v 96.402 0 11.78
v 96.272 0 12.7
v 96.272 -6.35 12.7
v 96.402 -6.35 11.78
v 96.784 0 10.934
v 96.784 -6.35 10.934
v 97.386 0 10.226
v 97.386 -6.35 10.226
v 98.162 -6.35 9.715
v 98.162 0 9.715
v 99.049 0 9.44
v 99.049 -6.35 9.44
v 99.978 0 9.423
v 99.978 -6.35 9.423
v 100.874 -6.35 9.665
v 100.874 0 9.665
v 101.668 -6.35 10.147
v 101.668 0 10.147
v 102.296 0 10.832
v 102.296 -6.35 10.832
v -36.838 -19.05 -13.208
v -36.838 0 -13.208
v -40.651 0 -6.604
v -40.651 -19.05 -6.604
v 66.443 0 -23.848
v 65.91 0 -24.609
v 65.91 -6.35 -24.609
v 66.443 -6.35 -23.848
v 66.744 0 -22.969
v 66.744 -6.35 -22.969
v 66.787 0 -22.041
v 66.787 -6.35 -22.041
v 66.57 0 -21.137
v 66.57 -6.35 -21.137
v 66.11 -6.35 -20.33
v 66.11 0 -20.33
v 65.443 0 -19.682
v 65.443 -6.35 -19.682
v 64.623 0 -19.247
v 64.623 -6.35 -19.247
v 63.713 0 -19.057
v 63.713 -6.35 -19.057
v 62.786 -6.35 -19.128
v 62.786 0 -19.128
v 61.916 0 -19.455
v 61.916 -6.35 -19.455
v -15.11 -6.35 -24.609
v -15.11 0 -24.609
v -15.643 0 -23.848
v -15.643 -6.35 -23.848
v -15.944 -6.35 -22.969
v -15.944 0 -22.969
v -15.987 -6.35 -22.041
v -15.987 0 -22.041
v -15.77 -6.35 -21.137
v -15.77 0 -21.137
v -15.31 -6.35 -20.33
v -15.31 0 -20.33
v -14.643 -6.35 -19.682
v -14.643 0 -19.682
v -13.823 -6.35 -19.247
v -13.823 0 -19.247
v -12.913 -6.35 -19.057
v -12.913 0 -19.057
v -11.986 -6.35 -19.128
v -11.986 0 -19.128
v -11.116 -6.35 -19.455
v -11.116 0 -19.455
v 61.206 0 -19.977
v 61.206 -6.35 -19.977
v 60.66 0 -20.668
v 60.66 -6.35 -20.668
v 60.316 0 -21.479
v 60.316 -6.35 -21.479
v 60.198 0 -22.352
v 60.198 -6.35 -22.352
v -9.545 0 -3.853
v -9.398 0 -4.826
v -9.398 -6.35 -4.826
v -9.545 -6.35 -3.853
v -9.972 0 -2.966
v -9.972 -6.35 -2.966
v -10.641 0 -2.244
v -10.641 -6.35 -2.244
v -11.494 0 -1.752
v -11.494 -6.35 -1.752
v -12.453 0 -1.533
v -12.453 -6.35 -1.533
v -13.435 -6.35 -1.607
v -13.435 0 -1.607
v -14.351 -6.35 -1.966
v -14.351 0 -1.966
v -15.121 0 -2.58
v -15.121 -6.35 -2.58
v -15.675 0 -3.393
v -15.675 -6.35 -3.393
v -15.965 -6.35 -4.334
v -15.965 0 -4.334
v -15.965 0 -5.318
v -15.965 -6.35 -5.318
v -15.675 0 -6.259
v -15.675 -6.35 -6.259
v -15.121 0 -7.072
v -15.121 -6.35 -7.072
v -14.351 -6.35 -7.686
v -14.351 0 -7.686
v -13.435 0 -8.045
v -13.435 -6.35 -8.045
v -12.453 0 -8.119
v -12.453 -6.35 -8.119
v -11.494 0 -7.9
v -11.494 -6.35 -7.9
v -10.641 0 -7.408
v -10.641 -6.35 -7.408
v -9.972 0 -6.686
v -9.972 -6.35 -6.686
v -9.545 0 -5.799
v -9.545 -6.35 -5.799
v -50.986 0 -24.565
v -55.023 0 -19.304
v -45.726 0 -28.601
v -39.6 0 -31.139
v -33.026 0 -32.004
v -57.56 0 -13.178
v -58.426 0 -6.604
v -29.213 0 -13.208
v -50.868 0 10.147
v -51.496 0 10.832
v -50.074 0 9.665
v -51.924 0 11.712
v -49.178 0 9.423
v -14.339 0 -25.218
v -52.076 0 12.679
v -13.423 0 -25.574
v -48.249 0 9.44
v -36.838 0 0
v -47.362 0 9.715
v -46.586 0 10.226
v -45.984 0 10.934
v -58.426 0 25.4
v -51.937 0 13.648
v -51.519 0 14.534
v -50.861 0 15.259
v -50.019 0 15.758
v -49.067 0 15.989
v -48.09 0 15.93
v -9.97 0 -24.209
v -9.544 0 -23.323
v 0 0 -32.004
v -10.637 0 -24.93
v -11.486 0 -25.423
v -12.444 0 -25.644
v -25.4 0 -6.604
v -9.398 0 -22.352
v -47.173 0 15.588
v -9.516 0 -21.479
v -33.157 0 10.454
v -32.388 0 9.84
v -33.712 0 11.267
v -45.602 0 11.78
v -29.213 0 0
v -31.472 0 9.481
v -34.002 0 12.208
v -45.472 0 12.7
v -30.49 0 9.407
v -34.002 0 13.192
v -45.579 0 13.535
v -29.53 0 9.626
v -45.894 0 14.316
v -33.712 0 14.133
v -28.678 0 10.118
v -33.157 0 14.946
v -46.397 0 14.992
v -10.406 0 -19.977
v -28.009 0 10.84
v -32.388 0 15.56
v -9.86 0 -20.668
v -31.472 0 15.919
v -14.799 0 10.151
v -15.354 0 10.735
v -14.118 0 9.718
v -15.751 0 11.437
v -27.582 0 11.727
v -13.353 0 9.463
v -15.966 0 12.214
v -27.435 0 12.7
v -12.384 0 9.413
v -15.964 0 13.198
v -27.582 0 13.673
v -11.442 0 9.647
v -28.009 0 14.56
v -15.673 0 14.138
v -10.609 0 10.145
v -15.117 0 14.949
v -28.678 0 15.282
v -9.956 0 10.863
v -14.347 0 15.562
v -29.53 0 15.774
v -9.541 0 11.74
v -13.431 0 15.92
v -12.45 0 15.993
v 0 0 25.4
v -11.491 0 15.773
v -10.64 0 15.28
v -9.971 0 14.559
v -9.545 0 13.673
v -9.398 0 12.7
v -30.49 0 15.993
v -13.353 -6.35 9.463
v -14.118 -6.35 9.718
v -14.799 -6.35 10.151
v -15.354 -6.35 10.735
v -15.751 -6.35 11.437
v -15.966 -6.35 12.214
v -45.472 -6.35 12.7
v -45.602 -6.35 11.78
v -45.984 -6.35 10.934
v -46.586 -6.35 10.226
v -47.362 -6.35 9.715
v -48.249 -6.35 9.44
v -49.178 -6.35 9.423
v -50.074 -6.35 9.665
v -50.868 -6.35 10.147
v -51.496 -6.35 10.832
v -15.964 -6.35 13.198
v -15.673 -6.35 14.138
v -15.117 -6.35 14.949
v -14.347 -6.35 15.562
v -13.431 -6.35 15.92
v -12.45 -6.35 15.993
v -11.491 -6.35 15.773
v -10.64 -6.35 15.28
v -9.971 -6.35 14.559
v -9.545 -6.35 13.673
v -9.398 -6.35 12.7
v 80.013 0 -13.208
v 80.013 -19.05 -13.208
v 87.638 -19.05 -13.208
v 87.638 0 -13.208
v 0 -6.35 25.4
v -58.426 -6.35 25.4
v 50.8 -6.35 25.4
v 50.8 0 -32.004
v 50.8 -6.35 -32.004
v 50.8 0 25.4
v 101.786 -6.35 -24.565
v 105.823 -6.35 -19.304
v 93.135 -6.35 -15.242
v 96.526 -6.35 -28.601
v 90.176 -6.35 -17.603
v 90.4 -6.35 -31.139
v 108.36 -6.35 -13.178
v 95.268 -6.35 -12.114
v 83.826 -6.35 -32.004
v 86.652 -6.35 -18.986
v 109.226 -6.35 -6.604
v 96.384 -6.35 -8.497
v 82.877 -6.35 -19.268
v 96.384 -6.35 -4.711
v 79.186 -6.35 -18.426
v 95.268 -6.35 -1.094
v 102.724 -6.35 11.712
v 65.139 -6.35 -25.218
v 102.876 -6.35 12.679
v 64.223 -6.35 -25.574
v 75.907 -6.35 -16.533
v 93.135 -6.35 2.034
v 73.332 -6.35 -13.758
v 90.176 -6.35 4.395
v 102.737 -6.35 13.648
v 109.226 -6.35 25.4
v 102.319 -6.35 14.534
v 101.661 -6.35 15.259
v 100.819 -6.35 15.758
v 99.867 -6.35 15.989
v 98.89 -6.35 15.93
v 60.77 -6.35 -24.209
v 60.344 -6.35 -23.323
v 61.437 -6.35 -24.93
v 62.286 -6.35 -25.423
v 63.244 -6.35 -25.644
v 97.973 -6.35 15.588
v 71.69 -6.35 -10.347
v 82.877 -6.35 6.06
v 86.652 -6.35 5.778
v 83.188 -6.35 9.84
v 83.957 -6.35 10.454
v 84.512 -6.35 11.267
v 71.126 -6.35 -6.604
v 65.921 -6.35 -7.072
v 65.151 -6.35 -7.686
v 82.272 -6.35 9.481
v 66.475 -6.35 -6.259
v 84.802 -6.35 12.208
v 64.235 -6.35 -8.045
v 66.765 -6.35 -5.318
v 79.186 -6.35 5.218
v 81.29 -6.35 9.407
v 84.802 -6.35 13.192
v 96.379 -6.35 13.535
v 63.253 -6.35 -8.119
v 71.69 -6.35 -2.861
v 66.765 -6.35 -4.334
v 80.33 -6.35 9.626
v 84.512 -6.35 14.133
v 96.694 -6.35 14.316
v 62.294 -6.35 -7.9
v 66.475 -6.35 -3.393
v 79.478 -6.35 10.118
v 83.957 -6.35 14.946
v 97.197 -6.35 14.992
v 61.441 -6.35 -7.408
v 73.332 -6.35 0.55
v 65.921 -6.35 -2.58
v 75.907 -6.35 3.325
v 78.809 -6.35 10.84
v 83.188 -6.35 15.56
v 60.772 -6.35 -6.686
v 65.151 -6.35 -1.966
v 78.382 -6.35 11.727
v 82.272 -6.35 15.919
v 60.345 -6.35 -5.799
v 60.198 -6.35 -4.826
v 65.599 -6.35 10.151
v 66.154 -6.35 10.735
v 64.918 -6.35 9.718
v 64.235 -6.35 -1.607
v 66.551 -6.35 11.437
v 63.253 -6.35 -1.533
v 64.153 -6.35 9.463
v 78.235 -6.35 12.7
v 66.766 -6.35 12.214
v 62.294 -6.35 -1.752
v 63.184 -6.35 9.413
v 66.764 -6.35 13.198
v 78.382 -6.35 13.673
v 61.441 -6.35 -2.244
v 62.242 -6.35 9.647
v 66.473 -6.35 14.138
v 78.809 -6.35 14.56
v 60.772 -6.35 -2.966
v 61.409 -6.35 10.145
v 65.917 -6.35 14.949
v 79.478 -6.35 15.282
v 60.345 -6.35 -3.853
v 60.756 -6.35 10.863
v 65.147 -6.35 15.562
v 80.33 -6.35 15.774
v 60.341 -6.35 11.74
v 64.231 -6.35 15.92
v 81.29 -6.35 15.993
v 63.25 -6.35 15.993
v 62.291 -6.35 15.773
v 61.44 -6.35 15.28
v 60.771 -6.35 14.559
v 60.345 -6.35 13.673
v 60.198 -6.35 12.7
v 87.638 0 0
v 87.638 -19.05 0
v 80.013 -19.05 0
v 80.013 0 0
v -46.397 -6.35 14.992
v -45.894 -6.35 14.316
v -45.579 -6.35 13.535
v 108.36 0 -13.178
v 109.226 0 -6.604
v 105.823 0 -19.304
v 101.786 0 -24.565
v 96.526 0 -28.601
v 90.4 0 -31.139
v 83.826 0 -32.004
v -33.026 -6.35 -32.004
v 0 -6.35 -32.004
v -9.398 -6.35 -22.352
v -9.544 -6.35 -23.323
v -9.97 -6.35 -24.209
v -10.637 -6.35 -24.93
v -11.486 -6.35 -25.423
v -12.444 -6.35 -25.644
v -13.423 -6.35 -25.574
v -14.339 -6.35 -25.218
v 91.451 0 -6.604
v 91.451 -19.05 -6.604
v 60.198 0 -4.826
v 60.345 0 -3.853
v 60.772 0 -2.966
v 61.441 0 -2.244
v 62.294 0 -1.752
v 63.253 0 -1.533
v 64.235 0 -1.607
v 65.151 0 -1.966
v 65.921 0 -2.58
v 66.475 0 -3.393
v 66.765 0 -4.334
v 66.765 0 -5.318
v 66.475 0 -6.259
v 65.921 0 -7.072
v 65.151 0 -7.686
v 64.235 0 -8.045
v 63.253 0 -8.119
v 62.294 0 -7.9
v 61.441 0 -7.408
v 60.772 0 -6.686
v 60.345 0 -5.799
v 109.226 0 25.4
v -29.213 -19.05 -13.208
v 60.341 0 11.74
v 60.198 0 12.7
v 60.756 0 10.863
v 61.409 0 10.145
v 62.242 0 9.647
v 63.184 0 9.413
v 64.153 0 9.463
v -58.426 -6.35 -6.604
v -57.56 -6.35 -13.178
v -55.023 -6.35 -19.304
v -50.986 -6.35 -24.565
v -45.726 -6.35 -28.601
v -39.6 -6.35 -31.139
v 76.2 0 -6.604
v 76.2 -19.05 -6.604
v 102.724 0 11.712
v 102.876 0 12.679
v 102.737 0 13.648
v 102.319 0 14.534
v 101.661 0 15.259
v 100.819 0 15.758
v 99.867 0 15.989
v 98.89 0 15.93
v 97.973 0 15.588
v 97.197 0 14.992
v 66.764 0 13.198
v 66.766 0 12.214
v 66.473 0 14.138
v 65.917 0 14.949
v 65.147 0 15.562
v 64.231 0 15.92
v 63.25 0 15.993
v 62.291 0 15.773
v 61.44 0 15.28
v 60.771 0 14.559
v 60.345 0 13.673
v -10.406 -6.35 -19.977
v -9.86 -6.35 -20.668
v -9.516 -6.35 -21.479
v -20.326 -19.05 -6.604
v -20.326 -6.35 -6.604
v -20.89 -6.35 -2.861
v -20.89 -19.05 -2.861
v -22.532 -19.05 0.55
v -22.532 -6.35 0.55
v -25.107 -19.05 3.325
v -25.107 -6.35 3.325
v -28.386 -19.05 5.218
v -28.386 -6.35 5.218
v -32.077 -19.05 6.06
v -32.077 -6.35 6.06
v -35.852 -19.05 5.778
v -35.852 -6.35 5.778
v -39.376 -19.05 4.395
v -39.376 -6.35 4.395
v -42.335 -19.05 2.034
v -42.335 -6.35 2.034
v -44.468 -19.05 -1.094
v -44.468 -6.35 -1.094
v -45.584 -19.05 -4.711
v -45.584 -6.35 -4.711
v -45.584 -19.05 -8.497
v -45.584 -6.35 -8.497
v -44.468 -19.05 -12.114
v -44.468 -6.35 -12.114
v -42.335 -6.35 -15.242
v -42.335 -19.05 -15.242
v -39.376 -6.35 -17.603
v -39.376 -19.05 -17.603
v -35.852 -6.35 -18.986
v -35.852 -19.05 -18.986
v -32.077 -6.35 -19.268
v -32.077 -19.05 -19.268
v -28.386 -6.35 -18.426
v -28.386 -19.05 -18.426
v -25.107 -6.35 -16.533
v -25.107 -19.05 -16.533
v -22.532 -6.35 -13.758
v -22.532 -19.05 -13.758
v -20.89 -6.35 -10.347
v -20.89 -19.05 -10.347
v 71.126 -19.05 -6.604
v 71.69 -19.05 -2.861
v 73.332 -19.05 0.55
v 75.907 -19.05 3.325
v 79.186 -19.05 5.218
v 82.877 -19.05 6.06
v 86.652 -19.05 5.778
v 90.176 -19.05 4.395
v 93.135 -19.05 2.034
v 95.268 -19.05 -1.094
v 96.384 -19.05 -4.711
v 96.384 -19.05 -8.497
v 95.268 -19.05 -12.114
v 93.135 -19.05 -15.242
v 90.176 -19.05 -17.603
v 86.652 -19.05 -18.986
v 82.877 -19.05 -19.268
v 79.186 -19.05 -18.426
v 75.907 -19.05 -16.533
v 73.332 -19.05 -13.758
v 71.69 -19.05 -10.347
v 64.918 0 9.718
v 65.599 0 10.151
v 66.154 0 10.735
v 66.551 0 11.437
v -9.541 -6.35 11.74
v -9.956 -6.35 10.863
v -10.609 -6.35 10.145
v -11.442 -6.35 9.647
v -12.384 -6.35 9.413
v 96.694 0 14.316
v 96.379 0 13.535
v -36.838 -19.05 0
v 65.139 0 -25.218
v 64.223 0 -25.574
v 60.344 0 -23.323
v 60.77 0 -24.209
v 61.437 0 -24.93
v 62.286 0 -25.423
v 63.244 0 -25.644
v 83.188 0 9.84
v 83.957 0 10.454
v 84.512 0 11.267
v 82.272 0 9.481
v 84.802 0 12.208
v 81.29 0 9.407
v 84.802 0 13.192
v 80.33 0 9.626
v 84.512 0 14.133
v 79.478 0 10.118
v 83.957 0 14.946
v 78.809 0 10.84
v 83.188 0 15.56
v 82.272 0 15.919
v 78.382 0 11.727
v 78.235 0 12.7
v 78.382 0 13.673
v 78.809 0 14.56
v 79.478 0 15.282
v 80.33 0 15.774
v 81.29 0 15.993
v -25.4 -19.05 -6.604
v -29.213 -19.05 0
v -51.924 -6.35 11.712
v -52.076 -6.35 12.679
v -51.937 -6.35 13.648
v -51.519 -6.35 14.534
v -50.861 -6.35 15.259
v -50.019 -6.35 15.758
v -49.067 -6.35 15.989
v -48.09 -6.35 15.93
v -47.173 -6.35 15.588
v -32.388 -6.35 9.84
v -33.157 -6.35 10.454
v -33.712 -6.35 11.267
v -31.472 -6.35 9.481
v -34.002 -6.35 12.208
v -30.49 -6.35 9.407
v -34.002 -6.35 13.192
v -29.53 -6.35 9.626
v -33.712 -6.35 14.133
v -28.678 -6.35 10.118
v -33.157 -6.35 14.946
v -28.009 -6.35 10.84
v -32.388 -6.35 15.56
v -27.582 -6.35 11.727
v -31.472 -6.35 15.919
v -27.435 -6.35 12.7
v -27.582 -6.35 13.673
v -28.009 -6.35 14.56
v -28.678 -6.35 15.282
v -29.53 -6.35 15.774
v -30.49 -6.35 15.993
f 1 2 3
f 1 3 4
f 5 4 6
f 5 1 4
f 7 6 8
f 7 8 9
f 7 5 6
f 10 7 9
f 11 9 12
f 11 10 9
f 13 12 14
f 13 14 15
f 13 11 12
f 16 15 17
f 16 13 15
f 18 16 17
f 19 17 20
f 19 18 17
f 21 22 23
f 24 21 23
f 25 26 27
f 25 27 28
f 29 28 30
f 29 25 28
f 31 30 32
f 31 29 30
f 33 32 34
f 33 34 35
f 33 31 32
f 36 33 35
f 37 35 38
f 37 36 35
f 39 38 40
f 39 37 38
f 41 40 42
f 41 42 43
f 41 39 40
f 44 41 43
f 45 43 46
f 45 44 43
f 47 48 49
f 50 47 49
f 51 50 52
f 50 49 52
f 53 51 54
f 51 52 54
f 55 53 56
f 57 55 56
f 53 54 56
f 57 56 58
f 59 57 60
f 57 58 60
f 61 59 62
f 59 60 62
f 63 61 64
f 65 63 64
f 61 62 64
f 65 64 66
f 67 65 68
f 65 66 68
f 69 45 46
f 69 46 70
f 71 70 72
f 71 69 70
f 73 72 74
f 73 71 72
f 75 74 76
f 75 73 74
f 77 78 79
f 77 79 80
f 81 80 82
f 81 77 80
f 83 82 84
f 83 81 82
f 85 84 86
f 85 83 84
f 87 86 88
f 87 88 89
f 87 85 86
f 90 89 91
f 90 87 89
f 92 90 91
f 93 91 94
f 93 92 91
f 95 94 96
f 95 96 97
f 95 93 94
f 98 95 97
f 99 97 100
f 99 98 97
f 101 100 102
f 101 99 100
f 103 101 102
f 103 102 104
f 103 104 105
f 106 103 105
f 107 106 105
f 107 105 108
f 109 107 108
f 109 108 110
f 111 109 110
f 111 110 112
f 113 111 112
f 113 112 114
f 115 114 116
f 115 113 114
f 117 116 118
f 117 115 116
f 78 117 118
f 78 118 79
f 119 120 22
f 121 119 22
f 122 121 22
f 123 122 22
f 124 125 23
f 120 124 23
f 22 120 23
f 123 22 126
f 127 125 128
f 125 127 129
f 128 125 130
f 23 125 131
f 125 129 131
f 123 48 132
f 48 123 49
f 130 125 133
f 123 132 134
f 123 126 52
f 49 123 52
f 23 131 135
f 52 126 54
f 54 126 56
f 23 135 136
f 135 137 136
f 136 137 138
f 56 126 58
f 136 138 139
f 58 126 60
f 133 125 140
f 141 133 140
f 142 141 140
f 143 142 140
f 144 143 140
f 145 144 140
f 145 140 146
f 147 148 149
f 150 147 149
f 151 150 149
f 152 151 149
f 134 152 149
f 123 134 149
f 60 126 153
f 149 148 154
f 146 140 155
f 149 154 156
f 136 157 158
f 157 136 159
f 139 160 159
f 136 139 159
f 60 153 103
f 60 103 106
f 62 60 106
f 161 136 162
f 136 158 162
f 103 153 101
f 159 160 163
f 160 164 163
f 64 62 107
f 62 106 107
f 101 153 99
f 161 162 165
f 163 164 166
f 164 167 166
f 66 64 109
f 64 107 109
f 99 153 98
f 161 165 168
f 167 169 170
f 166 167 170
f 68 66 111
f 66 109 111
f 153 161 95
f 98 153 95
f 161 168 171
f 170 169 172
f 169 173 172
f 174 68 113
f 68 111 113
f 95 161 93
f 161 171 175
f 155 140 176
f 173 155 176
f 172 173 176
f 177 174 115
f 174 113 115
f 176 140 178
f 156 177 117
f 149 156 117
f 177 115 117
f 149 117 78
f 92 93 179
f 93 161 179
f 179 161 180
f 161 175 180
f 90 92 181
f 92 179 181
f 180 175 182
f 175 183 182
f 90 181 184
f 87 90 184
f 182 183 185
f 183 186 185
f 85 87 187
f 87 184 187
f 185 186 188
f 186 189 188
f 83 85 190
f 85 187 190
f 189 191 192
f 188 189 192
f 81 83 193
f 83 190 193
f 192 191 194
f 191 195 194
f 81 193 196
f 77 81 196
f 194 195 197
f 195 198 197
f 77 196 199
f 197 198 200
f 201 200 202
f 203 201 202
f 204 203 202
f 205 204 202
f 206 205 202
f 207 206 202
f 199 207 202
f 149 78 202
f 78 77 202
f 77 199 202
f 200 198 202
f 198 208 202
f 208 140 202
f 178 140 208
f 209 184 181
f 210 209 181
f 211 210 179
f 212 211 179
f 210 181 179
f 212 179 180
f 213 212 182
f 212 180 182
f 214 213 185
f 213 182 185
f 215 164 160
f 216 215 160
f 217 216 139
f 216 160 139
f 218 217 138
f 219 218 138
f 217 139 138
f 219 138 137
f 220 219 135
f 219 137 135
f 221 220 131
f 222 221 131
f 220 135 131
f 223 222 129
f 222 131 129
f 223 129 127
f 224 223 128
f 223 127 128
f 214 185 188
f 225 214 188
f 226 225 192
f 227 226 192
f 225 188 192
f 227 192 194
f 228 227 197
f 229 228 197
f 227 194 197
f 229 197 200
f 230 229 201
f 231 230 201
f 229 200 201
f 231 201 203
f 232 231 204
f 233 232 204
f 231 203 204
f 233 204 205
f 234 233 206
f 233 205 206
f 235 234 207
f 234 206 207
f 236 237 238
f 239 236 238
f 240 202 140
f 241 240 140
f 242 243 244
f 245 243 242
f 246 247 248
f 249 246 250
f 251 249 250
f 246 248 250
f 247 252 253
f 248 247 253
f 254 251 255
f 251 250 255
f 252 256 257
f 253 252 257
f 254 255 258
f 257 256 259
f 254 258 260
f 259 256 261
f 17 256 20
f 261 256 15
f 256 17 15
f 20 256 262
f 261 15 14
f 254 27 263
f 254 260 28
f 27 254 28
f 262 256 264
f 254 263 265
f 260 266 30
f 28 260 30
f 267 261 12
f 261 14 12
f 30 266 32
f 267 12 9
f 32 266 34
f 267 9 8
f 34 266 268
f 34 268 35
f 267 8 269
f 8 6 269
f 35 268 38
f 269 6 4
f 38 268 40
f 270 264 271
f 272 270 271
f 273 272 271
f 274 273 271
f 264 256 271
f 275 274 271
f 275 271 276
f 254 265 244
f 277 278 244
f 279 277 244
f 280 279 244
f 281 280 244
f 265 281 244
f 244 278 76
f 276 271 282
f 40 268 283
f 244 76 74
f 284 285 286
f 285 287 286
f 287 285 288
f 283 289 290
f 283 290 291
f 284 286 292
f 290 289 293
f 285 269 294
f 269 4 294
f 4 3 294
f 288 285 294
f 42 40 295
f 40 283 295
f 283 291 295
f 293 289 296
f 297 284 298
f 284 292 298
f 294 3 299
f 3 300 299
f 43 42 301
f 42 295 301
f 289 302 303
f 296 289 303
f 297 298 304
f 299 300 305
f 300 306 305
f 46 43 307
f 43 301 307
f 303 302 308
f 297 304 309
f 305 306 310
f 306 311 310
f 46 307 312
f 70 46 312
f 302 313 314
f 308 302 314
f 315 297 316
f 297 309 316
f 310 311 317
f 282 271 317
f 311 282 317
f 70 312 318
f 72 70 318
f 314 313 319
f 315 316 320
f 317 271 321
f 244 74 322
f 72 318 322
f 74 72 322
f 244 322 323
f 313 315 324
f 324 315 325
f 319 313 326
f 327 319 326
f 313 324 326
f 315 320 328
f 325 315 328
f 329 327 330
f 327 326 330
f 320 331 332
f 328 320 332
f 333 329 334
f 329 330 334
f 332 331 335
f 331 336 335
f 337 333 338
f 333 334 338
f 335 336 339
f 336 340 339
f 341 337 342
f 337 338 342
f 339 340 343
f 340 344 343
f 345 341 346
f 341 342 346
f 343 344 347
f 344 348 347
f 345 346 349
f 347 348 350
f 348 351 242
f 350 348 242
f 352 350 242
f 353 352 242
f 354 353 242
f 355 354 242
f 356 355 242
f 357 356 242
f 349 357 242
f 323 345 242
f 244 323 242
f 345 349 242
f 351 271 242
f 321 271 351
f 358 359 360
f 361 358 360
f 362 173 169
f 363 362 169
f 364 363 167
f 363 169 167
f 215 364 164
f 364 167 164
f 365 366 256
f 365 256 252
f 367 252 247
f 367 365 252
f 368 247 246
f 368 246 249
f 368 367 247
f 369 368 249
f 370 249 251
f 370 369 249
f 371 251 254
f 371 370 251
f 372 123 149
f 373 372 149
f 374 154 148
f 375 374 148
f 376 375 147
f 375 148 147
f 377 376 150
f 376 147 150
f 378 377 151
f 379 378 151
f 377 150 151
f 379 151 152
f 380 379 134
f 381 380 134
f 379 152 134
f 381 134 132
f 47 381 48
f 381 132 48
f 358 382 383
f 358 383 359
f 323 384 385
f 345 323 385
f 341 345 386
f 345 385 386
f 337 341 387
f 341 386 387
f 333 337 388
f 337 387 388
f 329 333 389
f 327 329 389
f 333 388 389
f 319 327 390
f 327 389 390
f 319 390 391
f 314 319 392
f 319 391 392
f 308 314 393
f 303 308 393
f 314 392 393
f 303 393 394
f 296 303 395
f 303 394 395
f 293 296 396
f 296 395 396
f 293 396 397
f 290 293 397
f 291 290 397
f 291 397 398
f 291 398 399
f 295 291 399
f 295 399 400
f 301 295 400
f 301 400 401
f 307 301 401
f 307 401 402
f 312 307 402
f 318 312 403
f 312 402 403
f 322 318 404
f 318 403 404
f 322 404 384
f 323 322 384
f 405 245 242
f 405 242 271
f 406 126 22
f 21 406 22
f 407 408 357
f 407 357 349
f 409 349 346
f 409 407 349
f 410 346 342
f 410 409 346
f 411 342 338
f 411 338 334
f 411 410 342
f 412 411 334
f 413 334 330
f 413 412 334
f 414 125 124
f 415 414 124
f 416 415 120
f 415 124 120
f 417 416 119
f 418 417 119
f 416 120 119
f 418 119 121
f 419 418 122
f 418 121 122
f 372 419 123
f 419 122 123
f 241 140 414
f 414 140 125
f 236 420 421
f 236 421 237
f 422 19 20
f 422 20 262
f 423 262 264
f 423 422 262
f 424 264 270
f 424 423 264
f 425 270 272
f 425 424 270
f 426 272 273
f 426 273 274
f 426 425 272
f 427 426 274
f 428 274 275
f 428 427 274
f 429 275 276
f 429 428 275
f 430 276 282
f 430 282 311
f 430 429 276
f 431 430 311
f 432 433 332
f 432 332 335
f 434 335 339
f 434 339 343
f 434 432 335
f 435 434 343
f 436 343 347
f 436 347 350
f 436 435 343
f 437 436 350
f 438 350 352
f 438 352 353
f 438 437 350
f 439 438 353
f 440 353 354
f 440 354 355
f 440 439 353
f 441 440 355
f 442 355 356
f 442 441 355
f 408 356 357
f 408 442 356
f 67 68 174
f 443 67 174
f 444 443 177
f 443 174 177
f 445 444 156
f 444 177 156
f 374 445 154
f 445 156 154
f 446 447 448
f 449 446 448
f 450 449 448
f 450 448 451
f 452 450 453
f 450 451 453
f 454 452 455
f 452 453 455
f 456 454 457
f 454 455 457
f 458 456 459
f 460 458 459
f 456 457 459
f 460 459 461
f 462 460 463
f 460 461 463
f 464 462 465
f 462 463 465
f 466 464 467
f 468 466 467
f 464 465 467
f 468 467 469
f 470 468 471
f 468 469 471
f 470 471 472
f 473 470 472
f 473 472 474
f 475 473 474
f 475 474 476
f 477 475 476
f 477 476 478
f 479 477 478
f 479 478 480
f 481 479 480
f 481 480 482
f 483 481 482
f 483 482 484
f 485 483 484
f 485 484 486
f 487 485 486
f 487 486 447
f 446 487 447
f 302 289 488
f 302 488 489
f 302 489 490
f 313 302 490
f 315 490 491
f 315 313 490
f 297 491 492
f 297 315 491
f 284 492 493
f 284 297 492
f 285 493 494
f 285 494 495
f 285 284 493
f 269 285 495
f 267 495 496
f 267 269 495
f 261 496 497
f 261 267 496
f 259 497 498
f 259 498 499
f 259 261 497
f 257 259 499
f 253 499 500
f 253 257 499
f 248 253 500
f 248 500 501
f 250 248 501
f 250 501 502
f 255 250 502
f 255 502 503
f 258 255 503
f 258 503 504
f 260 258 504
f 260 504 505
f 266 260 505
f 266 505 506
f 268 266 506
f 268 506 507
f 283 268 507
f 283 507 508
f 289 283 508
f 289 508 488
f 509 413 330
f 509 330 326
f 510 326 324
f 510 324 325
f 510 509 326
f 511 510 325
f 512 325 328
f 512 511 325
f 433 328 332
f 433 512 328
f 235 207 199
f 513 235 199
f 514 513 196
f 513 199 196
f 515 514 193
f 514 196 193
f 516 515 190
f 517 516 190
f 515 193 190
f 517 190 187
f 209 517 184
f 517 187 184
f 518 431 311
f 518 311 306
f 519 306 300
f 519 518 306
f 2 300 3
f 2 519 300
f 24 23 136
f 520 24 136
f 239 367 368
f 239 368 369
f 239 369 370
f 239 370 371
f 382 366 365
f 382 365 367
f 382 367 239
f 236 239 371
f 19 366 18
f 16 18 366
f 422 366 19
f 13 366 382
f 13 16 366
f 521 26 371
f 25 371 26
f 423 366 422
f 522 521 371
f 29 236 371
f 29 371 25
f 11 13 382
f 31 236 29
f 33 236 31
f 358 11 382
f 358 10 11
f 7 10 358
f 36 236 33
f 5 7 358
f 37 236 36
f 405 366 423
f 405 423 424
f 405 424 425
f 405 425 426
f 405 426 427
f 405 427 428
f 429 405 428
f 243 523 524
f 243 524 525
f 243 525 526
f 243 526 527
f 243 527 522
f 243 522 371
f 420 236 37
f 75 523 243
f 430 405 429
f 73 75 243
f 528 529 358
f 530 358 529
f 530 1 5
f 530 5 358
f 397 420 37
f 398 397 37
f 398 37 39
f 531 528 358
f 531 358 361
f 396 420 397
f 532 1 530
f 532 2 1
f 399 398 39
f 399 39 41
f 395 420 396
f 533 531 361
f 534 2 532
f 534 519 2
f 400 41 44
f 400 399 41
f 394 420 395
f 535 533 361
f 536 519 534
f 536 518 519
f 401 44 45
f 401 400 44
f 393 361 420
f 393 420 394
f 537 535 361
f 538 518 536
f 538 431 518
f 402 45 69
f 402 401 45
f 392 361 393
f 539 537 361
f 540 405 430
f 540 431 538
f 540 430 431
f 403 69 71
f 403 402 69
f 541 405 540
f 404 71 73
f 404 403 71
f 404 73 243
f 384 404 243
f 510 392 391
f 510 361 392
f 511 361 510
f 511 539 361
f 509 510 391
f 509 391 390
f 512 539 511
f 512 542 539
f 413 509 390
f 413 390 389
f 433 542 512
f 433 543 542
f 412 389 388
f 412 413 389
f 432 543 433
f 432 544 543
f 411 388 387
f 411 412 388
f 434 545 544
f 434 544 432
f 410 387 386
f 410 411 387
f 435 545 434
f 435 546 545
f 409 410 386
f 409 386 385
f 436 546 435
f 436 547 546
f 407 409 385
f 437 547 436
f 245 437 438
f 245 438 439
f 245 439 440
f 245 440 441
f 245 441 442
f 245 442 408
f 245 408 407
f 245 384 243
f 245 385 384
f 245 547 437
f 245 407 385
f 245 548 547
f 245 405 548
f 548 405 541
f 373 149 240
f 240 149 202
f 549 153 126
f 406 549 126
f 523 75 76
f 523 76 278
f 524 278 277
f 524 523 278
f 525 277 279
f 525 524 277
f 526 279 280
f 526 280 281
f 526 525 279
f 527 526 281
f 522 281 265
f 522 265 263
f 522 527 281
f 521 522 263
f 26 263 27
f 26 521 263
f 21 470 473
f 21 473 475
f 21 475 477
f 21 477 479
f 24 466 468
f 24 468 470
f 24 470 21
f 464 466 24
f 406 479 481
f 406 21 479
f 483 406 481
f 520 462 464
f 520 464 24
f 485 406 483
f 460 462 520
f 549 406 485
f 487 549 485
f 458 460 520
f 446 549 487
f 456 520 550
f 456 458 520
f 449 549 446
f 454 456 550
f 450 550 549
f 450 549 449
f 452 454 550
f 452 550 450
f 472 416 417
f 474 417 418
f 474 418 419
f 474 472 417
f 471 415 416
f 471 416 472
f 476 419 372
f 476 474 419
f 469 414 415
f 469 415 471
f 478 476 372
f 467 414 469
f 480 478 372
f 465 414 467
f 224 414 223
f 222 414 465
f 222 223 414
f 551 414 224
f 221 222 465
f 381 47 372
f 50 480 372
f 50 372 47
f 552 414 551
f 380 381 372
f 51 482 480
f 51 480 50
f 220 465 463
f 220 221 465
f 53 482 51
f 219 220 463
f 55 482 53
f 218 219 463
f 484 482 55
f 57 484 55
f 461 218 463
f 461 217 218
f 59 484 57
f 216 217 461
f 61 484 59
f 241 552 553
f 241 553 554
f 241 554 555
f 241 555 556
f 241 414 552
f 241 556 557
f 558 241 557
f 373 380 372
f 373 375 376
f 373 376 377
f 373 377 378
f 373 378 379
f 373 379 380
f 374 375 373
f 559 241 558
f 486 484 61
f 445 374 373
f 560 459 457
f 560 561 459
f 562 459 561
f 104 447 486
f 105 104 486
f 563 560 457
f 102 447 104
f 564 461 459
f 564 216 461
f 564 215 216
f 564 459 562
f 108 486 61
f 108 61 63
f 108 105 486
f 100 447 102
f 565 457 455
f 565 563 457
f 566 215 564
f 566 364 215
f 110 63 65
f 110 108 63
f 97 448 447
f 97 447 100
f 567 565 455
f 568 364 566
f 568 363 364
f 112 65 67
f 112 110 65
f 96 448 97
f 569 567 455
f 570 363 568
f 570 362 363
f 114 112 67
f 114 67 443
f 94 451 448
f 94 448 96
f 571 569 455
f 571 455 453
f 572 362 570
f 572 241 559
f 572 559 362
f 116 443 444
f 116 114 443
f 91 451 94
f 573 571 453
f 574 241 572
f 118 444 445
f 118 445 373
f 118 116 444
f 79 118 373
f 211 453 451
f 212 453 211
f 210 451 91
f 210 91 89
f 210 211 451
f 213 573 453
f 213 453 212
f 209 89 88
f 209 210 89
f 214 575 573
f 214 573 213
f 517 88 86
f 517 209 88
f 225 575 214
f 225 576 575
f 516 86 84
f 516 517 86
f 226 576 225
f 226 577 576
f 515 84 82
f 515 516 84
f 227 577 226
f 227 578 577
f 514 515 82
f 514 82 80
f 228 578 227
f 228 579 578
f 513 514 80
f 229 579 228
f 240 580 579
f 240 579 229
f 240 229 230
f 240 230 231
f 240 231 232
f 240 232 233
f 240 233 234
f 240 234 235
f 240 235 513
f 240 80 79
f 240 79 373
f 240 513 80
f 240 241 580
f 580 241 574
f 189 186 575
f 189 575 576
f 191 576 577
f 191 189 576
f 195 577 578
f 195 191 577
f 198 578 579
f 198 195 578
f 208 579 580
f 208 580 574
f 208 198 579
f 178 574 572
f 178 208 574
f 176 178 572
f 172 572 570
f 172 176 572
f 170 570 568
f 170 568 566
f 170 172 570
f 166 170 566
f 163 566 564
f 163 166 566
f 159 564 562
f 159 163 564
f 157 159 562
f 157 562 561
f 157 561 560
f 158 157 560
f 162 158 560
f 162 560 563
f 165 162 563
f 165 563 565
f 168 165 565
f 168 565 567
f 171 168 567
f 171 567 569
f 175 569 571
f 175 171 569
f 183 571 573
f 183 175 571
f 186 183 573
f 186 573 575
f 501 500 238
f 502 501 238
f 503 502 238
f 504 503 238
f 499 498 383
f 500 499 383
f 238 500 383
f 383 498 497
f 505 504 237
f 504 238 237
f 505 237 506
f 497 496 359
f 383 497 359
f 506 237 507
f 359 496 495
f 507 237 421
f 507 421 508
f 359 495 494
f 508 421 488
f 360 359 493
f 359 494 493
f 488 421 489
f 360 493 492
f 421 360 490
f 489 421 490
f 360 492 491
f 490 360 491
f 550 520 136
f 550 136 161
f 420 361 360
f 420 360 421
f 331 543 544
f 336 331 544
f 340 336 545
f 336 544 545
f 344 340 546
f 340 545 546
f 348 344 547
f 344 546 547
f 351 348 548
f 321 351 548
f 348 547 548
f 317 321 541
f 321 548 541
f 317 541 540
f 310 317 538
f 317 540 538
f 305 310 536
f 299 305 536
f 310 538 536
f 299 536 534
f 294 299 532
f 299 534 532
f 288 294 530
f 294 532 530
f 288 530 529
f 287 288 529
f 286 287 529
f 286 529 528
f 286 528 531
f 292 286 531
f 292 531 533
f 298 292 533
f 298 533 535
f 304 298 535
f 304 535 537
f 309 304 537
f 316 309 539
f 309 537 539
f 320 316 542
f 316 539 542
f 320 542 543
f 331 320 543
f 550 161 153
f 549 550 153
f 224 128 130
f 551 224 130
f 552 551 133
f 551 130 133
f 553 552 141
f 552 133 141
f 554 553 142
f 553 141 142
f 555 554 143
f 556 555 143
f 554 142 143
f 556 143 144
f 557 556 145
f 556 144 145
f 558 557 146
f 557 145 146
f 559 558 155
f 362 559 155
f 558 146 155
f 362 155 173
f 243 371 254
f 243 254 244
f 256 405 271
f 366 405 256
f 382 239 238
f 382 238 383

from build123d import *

# Parameters (mm, degrees)
F0_R     = 12.7
F0_R_2   = 3.302
F1_DEPTH = 6.35
F2_DEPTH = 19.05


# Not quite as in the source:
# - a feature names something its author has since deleted; it is built from what else it names


with BuildPart() as f1:
    # F0 (on Front) → F1 (new body)
    with BuildSketch(Plane.XZ):
        with BuildLine():
            Line((0, 0), (0, 25.4))
            Line((0, 25.4), (-58.4256423555, 25.4))
            Line((-58.4256423555, 25.4), (-58.4256423555, -6.604))
            ThreePointArc((-58.4256423555, -6.604), (-56.6297902297, 2.7770555445), (-51.4961775421, 10.8315765583))
            ThreePointArc((-51.4961775421, 10.8315765583), (-50.8609248096, 15.2586042986), (-46.3965154848, 14.9918271839))
            ThreePointArc((-46.3965154848, 14.9918271839), (-30.7169390659, 18.6908589465), (-15.9660970274, 12.2143929495))
            ThreePointArc((-15.9660970274, 12.2143929495), (-12.9434662353, 15.9930120243), (-9.398, 12.7))
            ThreePointArc((-9.398, 12.7), (-10.6088068714, 10.1445909723), (-13.3532485155, 9.4632623867))
            ThreePointArc((-13.3532485155, 9.4632623867), (-9.1003544415, 1.9248098954), (-7.6256423555, -6.604))
            ThreePointArc((-7.6256423555, -6.604), (-8.5138201304, -13.2621206963), (-11.1162385134, -19.4546040047))
            ThreePointArc((-11.1162385134, -19.4546040047), (-9.8598605291, -20.6677162396), (-9.398, -22.352))
            ThreePointArc((-9.398, -22.352), (-11.4864427084, -25.4229090999), (-15.1099822531, -24.609252653))
            ThreePointArc((-15.1099822531, -24.609252653), (-23.3347553317, -30.0826436724), (-33.0256423555, -32.004))
            Line((-33.0256423555, -32.004), (0, -32.004))
            Line((0, -32.004), (0, 0))
        make_face()
        with BuildLine():
            ThreePointArc((-51.4961775421, 10.8315765583), (-56.6297902297, 2.7770555445), (-58.4256423555, -6.604))
            ThreePointArc((-58.4256423555, -6.604), (-50.9861545976, -24.5645122421), (-33.0256423555, -32.004))
            ThreePointArc((-33.0256423555, -32.004), (-23.3347553317, -30.0826436724), (-15.1099822531, -24.609252653))
            ThreePointArc((-15.1099822531, -24.609252653), (-15.3102223776, -20.3296392163), (-11.1162385134, -19.4546040047))
            ThreePointArc((-11.1162385134, -19.4546040047), (-8.5138201304, -13.2621206963), (-7.6256423555, -6.604))
            ThreePointArc((-7.6256423555, -6.604), (-9.1003544415, 1.9248098954), (-13.3532485155, 9.4632623867))
            ThreePointArc((-13.3532485155, 9.4632623867), (-15.094263397, 10.4260811832), (-15.9660970274, 12.2143929495))
            ThreePointArc((-15.9660970274, 12.2143929495), (-30.7169390659, 18.6908589465), (-46.3965154848, 14.9918271839))
            ThreePointArc((-46.3965154848, 14.9918271839), (-45.7115779434, 13.9357044698), (-45.4716423555, 12.7))
            ThreePointArc((-45.4716423555, 12.7), (-47.795533769, 9.5461915732), (-51.4961775421, 10.8315765583))
        make_face()
        with Locations((-33.0256423555, -6.604)):
            Circle(F0_R, mode=Mode.SUBTRACT)
        with Locations((-12.7, -4.826)):
            Circle(F0_R_2, mode=Mode.SUBTRACT)
        with Locations((-30.7368211777, 12.7)):
            Circle(F0_R_2, mode=Mode.SUBTRACT)
    extrude(amount=F1_DEPTH)

    # F0 (on Front) → F2 (join)
    with BuildSketch(Plane.XZ):
        with Locations((-33.0256423555, -6.604)):
            Circle(F0_R)
        Polygon((-40.6512847109, -6.604), (-36.8384635332, 0), (-29.2128211777, 0), (-25.4, -6.604), (-29.2128211777, -13.208), (-36.8384635332, -13.208), align=None, mode=Mode.SUBTRACT)
    extrude(amount=F2_DEPTH)


with BuildPart() as f4_1:
    # F4: instance of F1
    add(f1.part.mirror(Plane.YZ.offset(25.4)))


solid = Compound([f1.part, f4_1.part])
